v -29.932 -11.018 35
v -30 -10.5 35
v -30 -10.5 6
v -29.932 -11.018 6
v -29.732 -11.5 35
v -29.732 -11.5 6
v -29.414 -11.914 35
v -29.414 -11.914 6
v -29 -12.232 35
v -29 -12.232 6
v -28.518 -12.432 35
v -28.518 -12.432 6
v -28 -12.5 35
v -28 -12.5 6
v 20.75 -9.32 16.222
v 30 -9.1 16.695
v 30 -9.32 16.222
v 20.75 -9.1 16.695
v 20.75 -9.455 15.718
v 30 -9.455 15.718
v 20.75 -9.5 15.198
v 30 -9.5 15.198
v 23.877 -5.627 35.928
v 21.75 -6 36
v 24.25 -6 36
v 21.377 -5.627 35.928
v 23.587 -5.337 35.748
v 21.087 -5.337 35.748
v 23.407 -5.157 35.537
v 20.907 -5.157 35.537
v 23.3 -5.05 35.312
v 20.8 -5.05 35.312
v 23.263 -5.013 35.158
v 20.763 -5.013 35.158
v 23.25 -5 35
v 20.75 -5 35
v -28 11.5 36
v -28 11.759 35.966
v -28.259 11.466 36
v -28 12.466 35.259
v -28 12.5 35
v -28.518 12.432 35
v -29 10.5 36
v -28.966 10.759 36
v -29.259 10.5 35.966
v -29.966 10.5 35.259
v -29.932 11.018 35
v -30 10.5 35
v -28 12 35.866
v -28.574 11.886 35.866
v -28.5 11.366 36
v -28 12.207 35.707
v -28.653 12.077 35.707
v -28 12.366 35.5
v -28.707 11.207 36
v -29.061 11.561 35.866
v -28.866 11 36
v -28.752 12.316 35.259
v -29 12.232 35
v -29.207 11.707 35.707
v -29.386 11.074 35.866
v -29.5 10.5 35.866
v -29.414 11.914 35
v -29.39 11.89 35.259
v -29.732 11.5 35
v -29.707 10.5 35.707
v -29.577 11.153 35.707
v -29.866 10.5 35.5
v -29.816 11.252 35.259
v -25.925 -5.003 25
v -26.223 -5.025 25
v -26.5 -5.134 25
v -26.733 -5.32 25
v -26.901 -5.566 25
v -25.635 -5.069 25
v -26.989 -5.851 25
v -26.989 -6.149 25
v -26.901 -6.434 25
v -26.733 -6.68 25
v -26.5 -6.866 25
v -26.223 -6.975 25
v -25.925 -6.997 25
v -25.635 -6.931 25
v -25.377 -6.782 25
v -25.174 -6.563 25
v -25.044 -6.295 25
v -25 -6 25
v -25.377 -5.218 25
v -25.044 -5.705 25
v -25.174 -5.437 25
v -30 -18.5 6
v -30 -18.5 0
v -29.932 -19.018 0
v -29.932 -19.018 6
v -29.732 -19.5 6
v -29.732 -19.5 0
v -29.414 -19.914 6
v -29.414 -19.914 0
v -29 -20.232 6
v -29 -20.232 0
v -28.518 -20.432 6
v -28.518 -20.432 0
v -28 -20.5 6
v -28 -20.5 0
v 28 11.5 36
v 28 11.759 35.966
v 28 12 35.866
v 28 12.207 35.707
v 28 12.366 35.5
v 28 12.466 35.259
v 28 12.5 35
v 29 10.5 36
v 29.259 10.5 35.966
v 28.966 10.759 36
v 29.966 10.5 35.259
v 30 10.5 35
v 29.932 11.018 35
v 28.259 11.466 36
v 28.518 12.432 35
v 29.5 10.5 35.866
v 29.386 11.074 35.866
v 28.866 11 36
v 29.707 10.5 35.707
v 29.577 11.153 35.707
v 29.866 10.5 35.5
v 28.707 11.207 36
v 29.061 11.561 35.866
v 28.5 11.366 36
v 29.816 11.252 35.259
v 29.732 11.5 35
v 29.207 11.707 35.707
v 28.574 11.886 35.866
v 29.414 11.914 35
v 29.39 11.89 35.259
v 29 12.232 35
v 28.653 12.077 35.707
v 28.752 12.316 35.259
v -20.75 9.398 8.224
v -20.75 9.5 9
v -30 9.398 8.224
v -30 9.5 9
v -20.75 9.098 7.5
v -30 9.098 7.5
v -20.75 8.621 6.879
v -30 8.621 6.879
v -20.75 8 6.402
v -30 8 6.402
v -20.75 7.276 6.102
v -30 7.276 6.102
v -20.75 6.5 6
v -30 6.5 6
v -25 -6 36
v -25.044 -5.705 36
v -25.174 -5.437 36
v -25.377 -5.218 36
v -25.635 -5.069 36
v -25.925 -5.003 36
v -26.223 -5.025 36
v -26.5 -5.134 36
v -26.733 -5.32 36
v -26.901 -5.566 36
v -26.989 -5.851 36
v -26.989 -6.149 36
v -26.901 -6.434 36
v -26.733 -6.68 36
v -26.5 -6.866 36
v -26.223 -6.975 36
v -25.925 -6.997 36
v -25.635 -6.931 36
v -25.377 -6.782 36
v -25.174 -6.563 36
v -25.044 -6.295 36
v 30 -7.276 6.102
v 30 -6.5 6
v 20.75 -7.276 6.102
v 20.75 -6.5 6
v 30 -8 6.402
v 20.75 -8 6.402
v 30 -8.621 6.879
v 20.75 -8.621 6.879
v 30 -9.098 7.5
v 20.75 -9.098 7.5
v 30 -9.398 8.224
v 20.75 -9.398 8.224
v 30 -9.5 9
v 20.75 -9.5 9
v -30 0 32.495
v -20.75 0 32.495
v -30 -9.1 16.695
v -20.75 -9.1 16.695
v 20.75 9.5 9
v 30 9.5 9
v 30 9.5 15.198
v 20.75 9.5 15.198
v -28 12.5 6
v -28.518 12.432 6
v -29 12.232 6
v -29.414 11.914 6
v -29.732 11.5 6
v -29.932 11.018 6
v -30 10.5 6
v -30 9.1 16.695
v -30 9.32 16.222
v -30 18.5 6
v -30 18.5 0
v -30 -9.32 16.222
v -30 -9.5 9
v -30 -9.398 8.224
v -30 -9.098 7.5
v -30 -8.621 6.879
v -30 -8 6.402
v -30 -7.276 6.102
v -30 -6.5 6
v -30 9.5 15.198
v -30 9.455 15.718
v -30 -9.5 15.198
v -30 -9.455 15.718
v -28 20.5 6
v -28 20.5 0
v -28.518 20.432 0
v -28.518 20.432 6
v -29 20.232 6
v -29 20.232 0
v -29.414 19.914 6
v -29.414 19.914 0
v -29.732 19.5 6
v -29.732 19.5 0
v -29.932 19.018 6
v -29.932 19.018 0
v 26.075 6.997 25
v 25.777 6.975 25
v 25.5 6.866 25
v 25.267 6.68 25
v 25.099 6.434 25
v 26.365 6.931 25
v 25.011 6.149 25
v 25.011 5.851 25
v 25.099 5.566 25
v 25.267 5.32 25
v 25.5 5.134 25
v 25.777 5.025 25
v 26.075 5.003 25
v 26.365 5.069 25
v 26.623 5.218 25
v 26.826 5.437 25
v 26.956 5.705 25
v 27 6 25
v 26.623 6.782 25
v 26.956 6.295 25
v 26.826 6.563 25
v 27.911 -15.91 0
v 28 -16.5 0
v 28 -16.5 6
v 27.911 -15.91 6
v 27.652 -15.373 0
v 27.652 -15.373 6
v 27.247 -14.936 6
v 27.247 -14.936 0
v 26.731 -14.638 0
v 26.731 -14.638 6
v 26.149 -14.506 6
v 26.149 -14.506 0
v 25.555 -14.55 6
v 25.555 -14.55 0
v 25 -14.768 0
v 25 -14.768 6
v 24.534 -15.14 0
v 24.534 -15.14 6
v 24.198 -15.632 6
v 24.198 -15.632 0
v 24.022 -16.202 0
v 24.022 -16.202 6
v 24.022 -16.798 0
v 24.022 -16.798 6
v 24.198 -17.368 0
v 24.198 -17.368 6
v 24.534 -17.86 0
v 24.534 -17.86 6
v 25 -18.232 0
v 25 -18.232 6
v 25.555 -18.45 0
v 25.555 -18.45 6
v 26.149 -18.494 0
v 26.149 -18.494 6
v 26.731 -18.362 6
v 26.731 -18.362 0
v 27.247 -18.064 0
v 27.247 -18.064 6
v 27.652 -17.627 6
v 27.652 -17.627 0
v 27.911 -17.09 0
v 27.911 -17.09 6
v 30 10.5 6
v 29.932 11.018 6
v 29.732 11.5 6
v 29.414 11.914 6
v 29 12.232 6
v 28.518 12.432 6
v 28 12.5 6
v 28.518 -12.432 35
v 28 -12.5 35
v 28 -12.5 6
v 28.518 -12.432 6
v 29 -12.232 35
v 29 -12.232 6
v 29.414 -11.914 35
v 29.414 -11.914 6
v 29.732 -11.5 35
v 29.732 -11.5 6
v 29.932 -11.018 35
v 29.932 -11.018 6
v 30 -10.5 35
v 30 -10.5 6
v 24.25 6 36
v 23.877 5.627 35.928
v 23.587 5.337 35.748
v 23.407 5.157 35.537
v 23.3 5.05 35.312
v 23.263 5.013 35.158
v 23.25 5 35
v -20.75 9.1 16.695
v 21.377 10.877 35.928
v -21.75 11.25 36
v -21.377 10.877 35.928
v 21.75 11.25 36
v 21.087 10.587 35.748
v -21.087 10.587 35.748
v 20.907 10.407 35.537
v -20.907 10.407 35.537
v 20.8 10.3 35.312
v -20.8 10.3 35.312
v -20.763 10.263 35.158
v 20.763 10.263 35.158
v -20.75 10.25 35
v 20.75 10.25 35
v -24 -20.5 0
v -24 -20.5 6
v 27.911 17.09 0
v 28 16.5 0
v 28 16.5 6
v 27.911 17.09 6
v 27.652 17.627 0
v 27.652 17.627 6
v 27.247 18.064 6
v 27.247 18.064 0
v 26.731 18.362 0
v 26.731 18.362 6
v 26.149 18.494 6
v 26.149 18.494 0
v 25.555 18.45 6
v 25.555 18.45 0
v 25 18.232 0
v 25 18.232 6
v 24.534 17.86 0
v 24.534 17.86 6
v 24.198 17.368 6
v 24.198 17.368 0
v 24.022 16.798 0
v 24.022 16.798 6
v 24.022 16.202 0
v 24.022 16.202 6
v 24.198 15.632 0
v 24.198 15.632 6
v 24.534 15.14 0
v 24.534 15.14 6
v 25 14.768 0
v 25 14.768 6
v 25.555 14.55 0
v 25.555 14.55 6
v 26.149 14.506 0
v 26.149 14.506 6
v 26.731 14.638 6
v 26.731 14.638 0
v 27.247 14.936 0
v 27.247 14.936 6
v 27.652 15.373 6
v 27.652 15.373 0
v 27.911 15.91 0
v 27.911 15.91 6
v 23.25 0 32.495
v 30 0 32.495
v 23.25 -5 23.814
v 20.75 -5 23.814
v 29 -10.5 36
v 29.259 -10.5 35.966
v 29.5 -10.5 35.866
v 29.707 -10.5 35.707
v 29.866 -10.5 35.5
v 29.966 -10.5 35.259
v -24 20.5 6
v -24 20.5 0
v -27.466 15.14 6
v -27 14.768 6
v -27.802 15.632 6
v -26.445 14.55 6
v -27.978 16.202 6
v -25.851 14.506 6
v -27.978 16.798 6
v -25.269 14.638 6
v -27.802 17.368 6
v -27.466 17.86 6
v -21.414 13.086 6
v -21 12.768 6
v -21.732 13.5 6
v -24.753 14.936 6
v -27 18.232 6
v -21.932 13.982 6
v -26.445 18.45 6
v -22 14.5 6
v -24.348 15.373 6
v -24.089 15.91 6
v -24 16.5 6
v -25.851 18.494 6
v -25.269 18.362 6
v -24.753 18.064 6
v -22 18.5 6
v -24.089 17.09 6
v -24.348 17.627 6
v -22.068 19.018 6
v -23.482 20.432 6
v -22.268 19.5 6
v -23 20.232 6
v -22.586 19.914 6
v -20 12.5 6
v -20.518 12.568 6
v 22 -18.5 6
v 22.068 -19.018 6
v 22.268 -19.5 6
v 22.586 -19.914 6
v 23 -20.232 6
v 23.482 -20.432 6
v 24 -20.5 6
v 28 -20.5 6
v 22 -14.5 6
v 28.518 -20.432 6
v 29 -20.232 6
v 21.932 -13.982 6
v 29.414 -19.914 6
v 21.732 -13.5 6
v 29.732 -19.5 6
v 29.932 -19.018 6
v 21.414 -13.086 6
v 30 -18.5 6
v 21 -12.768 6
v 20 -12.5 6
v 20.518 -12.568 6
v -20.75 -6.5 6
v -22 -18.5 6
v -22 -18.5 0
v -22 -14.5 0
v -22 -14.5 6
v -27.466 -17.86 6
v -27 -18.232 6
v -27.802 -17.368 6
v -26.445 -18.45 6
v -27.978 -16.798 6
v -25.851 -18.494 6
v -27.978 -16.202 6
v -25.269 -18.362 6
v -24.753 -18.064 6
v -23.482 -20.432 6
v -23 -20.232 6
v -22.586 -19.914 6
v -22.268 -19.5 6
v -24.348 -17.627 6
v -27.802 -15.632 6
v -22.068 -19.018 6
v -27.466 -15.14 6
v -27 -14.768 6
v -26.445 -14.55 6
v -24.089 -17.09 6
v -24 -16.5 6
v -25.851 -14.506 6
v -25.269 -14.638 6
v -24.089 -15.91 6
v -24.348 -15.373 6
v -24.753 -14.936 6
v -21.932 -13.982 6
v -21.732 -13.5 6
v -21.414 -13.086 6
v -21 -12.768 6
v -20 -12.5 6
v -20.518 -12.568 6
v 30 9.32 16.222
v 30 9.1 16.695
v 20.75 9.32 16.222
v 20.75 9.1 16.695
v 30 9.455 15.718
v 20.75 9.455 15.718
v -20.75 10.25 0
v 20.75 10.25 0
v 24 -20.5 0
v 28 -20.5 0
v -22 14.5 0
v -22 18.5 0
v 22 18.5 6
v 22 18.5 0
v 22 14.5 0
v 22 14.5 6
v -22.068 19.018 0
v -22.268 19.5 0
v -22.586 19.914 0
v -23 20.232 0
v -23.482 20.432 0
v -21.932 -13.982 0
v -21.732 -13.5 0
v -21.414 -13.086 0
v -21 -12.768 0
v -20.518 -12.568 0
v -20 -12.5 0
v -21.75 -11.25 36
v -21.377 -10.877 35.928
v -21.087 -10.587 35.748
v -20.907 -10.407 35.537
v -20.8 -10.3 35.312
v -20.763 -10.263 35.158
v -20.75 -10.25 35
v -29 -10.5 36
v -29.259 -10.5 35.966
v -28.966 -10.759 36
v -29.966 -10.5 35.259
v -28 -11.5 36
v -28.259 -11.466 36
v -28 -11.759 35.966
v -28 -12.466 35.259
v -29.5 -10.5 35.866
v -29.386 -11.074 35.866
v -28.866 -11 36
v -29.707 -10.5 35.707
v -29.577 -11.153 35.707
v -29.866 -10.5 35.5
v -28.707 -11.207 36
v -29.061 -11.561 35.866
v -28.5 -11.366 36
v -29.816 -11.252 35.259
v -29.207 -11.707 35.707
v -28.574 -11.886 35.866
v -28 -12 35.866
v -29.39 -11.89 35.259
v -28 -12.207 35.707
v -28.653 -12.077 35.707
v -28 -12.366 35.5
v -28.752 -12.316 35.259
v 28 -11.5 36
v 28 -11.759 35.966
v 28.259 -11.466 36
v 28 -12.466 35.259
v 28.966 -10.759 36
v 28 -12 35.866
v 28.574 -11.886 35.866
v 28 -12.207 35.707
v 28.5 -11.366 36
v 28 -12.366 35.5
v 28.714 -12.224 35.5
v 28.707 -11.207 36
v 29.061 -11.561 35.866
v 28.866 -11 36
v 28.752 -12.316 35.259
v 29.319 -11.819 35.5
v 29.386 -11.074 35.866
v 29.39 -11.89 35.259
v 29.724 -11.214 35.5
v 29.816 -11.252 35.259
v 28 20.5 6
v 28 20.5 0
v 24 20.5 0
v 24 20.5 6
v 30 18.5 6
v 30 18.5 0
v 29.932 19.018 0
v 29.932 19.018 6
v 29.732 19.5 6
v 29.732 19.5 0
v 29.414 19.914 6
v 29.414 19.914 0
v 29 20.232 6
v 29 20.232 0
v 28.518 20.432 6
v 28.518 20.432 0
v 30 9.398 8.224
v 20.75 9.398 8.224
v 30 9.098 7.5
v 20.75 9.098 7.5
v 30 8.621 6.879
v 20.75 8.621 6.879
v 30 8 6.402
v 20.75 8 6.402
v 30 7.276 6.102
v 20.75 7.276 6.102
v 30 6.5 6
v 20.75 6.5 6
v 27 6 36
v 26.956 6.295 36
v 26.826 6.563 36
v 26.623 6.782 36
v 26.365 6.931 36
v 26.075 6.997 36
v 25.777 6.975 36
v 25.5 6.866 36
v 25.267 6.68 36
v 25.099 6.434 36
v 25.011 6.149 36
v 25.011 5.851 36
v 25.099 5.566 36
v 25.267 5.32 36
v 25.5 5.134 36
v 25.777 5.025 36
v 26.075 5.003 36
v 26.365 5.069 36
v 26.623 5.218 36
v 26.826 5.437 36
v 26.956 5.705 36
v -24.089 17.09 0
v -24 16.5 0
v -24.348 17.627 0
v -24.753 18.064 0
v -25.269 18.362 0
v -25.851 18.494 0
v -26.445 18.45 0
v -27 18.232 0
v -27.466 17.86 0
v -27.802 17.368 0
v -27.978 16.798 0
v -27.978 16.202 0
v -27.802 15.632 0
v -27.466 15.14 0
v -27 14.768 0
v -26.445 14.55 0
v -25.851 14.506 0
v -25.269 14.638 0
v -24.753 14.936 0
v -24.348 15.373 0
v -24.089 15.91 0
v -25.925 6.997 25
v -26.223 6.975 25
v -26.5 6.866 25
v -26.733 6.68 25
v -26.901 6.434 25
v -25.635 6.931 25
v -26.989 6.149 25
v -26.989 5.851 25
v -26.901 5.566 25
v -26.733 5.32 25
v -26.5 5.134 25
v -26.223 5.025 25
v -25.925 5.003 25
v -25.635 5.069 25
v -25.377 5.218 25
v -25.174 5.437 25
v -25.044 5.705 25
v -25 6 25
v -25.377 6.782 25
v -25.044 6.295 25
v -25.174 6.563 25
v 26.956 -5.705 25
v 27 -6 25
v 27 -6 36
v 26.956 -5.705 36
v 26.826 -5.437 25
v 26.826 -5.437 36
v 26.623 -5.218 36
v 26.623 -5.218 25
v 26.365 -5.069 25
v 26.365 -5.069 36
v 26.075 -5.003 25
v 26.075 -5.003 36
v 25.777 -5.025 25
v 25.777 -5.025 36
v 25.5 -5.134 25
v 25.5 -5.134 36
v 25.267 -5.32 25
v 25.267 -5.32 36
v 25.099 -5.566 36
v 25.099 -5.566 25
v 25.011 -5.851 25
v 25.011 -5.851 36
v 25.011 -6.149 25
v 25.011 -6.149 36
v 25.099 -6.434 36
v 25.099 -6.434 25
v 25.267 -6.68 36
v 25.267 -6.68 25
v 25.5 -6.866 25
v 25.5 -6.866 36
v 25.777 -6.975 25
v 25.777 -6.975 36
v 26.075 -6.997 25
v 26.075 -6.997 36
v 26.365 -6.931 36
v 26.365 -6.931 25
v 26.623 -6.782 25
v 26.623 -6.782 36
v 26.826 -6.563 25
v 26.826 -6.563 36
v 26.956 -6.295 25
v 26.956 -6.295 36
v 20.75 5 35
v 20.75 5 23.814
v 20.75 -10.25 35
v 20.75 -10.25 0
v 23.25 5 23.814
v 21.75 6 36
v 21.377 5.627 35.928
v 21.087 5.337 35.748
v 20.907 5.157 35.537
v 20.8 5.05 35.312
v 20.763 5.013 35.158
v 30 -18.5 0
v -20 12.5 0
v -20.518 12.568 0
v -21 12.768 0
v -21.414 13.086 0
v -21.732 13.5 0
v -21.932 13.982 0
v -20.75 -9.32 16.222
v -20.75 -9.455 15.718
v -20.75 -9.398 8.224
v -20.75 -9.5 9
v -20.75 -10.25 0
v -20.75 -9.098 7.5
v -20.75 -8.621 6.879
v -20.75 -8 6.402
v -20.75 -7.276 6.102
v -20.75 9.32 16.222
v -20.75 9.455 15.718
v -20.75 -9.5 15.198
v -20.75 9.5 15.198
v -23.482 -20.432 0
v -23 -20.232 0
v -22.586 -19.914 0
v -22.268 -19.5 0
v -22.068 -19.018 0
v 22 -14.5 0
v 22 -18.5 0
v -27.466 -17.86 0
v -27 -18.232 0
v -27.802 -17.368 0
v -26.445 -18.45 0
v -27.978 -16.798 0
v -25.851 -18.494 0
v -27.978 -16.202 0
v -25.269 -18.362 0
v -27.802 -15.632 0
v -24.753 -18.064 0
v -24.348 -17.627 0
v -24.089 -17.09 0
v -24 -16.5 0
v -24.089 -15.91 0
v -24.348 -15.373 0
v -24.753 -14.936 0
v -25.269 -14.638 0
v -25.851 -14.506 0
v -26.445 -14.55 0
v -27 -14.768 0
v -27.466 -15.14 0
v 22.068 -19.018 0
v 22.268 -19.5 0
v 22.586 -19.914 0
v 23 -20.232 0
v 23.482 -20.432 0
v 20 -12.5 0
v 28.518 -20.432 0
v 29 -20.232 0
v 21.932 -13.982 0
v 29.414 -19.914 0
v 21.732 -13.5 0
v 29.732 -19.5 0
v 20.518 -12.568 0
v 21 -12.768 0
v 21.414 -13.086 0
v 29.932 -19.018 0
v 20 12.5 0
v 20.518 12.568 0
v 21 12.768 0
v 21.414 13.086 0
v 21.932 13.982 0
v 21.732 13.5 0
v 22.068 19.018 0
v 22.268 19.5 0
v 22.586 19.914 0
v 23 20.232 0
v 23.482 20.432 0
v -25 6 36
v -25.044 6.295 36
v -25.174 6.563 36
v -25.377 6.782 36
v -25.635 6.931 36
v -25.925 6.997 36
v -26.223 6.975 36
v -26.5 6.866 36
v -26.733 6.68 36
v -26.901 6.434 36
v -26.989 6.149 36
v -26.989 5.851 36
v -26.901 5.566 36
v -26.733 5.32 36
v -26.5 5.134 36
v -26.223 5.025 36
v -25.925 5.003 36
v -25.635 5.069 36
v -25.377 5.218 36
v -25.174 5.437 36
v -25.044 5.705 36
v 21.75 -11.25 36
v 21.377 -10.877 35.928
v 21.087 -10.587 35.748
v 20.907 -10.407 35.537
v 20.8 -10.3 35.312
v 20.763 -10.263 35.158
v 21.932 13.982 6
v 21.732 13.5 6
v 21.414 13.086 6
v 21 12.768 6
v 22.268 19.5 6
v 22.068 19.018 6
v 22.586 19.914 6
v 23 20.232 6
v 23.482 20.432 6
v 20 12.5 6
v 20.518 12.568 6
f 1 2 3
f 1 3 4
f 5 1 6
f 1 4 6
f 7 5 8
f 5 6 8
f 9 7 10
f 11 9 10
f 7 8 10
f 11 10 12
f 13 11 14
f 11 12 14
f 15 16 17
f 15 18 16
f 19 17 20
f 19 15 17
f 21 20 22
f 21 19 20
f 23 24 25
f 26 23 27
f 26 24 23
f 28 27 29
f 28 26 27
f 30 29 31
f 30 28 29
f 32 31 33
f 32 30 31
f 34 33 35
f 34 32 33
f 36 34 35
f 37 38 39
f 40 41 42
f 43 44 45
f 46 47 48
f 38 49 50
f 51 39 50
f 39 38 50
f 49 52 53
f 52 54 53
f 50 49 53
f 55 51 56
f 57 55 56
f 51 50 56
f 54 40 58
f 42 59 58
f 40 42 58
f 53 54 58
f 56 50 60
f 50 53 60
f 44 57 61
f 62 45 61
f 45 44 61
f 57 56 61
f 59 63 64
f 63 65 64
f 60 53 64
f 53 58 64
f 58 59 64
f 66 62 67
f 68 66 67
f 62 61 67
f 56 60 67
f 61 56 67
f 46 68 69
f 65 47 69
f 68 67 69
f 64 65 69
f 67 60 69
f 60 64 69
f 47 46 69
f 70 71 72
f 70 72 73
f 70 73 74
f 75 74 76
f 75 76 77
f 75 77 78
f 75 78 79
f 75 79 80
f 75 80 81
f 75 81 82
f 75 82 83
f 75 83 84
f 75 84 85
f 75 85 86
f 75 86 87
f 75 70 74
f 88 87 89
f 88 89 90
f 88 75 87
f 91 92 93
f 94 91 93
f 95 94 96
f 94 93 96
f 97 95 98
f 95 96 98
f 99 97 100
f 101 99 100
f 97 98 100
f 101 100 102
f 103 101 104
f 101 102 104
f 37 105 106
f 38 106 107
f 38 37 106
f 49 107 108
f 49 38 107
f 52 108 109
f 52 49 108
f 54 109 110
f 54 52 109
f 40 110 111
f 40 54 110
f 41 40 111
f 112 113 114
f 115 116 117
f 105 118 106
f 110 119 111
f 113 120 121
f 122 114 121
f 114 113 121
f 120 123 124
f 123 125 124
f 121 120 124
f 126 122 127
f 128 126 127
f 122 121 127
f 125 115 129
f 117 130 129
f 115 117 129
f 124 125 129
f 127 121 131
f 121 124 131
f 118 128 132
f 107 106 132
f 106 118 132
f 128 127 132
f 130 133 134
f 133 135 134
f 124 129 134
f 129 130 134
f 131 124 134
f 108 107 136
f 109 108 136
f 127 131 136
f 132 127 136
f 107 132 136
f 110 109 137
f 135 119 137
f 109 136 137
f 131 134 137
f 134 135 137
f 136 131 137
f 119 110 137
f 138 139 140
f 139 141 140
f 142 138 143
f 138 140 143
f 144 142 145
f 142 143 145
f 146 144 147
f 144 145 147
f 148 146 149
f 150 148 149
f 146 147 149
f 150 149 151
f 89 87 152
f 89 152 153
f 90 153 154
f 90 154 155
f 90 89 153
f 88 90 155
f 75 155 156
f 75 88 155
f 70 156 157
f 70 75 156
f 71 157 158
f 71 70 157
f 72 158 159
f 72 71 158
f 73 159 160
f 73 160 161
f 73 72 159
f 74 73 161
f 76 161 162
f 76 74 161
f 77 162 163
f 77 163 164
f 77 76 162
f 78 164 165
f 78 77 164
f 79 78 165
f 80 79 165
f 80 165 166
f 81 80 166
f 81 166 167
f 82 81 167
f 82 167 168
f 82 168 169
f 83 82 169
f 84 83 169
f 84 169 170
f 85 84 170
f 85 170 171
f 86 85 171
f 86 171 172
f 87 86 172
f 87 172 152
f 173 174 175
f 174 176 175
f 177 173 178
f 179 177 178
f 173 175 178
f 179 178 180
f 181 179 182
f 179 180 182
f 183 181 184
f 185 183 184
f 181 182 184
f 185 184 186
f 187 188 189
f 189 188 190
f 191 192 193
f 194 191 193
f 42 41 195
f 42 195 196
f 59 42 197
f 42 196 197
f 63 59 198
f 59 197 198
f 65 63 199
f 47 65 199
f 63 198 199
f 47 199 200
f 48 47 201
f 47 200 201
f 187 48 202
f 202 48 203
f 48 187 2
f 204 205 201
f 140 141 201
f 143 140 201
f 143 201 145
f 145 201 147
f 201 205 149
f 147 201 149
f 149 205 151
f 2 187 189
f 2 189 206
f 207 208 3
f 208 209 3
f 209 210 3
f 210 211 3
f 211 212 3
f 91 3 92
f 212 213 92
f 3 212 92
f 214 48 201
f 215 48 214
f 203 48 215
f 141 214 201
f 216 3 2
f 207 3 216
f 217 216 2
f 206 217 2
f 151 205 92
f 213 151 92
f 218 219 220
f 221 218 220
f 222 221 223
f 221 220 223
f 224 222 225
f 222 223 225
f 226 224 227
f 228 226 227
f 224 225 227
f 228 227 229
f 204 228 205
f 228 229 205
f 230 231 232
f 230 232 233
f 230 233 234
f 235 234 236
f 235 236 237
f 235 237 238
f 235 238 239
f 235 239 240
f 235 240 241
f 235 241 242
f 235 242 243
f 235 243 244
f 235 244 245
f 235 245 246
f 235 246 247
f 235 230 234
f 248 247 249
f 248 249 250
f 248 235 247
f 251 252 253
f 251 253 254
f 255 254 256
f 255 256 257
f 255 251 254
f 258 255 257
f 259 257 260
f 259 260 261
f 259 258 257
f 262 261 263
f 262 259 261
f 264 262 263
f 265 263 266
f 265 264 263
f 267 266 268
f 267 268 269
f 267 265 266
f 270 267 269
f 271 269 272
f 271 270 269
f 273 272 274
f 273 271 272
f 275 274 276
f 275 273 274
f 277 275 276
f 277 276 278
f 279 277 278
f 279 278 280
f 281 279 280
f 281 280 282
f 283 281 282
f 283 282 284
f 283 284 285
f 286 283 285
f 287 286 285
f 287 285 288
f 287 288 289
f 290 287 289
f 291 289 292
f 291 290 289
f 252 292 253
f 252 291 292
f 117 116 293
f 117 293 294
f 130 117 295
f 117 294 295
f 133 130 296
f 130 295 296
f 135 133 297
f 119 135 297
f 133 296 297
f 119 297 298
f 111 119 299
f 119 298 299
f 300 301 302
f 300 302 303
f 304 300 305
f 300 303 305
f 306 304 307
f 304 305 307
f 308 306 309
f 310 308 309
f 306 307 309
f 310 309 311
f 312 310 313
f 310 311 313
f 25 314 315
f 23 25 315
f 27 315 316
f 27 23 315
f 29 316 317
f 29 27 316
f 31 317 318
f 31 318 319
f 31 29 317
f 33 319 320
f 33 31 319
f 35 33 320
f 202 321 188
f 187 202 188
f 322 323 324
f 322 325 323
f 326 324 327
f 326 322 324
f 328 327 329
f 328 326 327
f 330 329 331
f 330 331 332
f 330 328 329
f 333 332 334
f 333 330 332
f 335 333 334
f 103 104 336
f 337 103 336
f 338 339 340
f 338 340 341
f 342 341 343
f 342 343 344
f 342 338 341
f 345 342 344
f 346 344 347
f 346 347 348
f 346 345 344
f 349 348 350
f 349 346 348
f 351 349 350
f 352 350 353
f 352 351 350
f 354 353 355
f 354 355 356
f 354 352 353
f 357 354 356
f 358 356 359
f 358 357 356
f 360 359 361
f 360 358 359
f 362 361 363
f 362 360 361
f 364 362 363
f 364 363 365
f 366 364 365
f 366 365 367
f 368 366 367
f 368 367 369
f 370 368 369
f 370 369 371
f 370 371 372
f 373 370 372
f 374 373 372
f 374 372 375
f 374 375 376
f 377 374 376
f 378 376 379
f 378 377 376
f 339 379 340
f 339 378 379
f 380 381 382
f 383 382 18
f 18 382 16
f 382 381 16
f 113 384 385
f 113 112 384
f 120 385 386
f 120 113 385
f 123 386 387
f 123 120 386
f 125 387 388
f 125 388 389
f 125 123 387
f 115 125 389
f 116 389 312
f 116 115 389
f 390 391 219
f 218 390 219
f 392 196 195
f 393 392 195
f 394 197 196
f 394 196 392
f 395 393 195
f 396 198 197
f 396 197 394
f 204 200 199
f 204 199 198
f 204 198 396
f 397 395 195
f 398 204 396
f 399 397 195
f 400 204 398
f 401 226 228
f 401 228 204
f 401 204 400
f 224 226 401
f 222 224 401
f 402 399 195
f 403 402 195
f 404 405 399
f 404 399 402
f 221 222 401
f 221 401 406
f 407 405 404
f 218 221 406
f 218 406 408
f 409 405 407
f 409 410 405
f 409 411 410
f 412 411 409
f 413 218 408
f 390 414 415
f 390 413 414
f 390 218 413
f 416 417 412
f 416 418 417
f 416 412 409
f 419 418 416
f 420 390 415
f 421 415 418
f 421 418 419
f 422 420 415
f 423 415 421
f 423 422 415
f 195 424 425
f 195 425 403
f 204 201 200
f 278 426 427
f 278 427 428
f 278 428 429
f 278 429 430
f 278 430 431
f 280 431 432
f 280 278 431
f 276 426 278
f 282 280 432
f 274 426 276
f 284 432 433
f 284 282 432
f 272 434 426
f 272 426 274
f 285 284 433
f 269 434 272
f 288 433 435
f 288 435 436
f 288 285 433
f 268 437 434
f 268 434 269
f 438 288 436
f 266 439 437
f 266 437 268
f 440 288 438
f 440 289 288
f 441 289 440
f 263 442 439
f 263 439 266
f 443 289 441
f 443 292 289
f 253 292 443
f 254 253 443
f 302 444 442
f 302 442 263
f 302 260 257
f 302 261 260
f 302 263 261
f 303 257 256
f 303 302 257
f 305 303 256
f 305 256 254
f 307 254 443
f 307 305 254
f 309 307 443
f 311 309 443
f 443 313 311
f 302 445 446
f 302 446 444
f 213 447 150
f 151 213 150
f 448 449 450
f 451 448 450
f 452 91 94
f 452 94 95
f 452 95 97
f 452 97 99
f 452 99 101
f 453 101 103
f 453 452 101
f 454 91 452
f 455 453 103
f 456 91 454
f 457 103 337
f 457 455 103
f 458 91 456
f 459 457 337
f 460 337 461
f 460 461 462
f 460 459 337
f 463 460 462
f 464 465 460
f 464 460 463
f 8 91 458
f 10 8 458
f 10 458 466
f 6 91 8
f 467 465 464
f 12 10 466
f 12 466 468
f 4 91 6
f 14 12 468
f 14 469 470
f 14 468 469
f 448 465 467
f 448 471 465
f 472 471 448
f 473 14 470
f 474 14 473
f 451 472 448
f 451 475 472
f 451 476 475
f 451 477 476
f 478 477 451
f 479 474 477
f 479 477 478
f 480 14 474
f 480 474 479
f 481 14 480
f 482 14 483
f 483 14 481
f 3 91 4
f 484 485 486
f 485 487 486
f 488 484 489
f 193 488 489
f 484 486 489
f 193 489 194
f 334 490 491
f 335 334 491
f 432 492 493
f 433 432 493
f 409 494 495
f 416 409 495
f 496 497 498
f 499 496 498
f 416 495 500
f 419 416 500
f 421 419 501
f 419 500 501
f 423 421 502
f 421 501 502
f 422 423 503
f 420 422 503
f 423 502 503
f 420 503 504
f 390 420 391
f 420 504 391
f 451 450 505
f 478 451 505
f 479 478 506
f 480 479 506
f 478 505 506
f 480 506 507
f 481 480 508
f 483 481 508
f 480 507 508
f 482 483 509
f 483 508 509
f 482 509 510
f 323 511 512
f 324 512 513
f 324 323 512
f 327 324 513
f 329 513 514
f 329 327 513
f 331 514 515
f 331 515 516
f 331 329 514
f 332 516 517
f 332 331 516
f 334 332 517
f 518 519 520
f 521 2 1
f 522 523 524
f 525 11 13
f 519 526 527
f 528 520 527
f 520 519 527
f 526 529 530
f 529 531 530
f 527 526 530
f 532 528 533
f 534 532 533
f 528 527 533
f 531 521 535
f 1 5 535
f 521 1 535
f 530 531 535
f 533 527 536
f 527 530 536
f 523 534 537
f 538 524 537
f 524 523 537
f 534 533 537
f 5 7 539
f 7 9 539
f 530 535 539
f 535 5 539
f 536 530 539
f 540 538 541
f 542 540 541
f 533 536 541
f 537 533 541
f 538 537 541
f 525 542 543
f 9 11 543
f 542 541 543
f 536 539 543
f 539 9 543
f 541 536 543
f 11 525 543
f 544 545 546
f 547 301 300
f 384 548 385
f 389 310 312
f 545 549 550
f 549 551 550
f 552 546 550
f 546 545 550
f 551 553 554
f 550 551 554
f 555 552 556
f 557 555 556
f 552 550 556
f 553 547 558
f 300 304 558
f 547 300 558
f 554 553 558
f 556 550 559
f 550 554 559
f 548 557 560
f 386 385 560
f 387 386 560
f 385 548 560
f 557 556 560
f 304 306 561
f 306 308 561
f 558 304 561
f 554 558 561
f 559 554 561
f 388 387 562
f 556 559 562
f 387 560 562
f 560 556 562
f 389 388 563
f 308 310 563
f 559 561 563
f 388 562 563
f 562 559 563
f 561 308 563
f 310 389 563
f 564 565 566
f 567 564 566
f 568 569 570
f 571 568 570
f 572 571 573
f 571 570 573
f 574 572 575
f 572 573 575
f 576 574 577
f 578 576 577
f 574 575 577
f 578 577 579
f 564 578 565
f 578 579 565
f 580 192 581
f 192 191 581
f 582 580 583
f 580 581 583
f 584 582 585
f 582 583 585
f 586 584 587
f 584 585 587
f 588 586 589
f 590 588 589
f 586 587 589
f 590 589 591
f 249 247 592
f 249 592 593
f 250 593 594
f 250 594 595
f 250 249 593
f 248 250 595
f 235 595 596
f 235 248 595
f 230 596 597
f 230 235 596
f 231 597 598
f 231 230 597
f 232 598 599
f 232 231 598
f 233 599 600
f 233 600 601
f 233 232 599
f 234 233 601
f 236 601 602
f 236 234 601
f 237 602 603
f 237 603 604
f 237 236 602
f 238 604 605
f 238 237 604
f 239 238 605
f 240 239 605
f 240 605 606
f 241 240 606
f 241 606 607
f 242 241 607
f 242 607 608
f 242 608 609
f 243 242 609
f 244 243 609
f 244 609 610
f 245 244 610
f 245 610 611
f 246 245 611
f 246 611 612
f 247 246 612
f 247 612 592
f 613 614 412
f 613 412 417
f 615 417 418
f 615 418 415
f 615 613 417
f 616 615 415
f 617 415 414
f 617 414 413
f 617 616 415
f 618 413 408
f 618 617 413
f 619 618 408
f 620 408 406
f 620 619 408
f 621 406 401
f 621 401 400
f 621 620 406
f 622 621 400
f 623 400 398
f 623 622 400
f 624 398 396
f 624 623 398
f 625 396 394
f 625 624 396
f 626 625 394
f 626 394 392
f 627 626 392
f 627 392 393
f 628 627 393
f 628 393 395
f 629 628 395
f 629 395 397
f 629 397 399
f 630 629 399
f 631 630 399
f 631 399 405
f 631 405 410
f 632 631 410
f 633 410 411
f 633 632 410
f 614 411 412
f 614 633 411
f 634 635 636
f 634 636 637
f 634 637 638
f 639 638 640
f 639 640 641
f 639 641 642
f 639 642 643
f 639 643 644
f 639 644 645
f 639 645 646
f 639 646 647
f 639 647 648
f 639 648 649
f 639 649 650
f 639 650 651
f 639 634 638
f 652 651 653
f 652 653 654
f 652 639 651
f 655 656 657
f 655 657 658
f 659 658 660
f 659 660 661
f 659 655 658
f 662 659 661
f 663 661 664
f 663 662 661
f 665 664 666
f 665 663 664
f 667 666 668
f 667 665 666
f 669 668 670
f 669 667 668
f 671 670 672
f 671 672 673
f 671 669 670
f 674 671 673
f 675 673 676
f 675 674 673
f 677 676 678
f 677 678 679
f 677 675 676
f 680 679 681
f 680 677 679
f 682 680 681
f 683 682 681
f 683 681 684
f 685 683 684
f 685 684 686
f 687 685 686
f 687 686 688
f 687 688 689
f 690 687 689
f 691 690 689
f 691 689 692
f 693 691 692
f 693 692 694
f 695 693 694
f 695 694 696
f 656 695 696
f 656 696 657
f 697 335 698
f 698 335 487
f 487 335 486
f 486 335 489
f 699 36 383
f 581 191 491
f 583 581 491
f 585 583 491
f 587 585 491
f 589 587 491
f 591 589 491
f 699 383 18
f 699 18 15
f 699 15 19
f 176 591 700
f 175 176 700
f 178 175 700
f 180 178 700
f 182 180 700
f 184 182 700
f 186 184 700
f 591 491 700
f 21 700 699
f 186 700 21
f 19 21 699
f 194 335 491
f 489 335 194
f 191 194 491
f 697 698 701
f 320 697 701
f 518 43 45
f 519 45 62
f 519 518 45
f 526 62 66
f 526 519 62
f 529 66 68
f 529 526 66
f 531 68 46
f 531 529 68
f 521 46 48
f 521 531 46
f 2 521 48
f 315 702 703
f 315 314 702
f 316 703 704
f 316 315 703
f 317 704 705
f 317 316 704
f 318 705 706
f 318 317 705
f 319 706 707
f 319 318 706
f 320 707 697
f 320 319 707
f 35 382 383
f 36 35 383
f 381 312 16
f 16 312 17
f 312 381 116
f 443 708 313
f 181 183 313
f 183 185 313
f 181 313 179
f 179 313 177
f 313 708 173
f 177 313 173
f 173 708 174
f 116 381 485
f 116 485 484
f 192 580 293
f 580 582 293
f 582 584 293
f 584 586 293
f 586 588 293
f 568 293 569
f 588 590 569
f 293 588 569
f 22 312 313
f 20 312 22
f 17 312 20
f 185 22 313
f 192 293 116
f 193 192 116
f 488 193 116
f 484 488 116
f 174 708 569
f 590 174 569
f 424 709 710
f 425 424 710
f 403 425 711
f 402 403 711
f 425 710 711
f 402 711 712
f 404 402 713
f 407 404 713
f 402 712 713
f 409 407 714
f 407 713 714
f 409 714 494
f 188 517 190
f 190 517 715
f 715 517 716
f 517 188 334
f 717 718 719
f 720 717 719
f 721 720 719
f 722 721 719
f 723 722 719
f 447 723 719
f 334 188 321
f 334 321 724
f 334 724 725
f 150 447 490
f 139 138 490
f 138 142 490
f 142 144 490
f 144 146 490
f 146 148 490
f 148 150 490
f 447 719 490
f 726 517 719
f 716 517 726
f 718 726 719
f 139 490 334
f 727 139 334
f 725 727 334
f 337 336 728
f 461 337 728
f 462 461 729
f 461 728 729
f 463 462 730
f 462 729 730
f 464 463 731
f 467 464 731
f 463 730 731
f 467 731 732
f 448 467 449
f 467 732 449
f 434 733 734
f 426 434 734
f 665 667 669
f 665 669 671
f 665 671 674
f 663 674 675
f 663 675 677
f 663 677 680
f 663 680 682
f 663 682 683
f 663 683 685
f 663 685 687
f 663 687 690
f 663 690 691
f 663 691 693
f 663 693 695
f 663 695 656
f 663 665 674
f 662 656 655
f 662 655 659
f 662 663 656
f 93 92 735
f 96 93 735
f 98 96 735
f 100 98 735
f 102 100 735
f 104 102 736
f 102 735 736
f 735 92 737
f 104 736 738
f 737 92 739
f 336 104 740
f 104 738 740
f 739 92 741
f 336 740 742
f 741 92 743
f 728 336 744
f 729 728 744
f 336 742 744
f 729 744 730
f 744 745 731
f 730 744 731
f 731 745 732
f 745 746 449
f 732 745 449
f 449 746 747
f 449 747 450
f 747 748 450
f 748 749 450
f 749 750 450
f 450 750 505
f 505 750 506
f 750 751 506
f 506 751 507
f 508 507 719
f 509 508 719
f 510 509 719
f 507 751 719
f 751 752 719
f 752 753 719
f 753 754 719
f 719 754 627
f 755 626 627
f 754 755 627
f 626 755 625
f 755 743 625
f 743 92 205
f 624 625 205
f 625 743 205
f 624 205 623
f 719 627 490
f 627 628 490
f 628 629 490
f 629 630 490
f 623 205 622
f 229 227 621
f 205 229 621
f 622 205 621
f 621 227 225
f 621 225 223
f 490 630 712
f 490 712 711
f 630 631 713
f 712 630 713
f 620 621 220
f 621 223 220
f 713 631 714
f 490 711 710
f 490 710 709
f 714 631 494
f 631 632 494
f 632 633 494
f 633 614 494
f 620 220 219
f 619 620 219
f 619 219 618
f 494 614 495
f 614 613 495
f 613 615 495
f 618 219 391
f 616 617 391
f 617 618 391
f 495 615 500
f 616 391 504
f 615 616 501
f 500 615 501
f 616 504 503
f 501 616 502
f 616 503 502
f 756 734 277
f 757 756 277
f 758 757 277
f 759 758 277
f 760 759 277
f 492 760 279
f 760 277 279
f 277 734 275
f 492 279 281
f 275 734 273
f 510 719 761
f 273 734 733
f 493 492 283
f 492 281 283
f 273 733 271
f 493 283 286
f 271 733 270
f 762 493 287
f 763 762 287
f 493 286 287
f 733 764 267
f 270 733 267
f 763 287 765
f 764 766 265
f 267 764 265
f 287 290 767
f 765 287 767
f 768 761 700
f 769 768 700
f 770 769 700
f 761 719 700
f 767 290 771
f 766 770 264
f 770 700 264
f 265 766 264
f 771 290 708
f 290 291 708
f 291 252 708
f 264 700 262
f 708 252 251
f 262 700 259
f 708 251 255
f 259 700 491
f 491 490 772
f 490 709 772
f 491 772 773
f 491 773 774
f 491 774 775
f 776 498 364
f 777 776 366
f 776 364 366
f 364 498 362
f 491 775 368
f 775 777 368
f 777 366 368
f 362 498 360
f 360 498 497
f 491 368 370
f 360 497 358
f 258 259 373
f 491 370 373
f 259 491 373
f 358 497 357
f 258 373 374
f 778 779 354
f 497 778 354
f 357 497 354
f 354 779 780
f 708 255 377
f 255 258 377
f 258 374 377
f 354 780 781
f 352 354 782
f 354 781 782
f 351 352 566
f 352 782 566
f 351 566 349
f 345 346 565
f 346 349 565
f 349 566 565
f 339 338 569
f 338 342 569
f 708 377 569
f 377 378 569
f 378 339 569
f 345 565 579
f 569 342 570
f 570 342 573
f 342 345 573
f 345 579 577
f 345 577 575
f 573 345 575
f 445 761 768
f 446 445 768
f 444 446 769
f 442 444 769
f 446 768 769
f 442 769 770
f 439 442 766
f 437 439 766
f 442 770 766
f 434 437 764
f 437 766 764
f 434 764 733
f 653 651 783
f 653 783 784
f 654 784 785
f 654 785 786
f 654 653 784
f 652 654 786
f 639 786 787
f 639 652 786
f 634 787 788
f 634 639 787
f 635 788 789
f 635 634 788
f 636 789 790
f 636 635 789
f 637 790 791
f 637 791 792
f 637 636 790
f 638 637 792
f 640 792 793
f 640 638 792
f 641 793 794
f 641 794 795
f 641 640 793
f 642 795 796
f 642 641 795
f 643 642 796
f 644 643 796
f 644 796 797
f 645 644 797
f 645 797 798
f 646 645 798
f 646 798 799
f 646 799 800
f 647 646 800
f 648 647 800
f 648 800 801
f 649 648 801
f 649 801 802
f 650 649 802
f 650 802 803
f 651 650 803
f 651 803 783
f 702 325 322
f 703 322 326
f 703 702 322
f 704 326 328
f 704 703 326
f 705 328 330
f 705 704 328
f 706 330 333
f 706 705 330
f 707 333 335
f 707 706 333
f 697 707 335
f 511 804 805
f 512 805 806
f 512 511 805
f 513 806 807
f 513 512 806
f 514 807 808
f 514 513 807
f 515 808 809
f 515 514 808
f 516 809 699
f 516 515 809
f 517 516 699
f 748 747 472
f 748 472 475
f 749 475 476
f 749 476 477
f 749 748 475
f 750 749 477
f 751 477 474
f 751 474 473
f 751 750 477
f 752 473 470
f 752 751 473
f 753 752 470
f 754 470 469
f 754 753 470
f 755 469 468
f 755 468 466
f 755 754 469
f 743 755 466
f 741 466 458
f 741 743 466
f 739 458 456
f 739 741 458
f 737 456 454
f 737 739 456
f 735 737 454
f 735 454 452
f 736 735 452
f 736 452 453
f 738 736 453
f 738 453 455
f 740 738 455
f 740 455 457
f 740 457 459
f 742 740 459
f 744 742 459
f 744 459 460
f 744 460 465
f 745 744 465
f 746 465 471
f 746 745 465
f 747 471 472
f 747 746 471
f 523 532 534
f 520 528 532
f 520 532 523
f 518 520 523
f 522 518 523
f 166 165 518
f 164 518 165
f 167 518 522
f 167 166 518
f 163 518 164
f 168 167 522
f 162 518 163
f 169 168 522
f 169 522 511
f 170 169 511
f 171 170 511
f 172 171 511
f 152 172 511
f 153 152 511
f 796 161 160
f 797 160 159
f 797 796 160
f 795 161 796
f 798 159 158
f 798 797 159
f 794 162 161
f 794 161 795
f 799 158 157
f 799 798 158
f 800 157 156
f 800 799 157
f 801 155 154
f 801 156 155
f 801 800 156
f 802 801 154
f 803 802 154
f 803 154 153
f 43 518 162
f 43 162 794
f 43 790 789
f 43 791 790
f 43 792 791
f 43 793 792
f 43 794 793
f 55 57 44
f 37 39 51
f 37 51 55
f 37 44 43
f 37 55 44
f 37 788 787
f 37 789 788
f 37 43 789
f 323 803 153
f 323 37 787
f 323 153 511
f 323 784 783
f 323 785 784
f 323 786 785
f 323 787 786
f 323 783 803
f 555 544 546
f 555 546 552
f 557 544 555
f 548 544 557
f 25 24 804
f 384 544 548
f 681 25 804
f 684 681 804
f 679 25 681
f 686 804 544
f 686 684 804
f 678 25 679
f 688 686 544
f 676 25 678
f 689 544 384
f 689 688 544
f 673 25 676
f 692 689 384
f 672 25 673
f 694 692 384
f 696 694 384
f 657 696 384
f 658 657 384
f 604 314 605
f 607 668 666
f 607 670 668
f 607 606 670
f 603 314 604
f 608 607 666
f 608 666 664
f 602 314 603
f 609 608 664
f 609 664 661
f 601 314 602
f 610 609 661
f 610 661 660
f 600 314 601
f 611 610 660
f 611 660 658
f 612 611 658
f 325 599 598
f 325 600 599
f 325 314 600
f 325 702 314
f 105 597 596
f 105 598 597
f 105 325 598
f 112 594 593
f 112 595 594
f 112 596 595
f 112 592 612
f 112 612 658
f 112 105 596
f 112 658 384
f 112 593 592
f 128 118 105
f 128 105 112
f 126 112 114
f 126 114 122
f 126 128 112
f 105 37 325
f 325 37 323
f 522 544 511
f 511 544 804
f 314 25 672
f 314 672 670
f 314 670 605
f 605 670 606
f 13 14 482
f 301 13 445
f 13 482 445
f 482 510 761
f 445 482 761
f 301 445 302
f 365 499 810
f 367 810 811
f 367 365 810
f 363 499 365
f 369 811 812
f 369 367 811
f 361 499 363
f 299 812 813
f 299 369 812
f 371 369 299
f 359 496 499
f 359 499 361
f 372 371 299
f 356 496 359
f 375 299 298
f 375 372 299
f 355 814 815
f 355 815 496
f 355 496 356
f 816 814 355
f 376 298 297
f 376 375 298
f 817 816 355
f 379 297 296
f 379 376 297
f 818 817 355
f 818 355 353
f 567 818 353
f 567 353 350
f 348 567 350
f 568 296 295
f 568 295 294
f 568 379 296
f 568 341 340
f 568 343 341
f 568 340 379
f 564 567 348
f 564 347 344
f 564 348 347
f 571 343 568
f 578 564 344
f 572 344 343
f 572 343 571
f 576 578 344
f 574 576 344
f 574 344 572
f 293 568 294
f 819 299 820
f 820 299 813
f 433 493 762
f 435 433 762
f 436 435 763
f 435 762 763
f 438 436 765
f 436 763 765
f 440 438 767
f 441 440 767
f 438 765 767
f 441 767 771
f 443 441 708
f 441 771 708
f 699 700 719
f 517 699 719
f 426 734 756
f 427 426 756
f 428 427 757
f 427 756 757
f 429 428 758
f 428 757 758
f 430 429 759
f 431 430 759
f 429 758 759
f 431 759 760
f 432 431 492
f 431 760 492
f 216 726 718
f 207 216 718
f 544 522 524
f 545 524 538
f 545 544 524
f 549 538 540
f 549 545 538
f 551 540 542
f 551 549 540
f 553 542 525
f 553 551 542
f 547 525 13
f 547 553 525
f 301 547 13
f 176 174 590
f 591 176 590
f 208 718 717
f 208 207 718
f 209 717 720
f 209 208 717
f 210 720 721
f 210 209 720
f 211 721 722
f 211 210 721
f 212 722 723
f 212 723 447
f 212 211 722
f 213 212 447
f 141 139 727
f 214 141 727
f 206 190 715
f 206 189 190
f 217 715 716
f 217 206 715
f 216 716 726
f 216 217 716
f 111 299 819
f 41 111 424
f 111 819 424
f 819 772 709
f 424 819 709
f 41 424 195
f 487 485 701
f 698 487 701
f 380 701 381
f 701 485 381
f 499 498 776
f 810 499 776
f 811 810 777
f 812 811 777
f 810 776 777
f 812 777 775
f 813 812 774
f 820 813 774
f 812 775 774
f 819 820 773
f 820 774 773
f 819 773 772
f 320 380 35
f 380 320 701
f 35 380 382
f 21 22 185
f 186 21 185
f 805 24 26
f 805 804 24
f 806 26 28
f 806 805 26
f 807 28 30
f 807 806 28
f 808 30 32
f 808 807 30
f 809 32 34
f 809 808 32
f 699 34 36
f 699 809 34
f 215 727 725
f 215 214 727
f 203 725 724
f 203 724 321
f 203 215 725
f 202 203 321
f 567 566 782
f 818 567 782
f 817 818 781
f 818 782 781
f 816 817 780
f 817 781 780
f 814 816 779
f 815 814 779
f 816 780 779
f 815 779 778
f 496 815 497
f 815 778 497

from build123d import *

# Parameters (mm, degrees)
F0_R     = 1
F1_DEPTH = 36
F0_R_2   = 2
F2_DEPTH = 6
F3_R     = 1
F4_R     = 1
F5_DEPTH = 25
F7_DEPTH = 100
F8_R     = 3


with BuildPart() as f1:
    # F0 (on Top) → F1 (new body)
    with BuildSketch(Plane.XY):
        with BuildLine():
            Line((-20, -12.5), (20, -12.5))
            Line((20, -12.5), (22, -12.5))
            Line((22, -12.5), (28, -12.5))
            ThreePointArc((28, -12.5), (29.414214, -11.914214), (30, -10.5))
            Line((30, -10.5), (30, 10.5))
            ThreePointArc((30, 10.5), (29.414214, 11.914214), (28, 12.5))
            Line((28, 12.5), (22, 12.5))
            Line((22, 12.5), (20, 12.5))
            Line((20, 12.5), (-20, 12.5))
            Line((-20, 12.5), (-28, 12.5))
            ThreePointArc((-28, 12.5), (-29.414214, 11.914214), (-30, 10.5))
            Line((-30, 10.5), (-30, -10.5))
            ThreePointArc((-30, -10.5), (-29.414214, -11.914214), (-28, -12.5))
            Line((-28, -12.5), (-22, -12.5))
            Line((-22, -12.5), (-20, -12.5))
        make_face()
        with Locations((-26, -6)):
            Circle(F0_R, mode=Mode.SUBTRACT)
        with Locations((26, -6)):
            Circle(F0_R, mode=Mode.SUBTRACT)
        with Locations((-26, 6)):
            Circle(F0_R, mode=Mode.SUBTRACT)
        Polygon((20.75, -10.25), (-20.75, -10.25), (-20.75, 10.25), (20.75, 10.25), (20.75, 5), (23.25, 5), (23.25, -5), (20.75, -5), align=None, mode=Mode.SUBTRACT)
        with Locations((26, 6)):
            Circle(F0_R, mode=Mode.SUBTRACT)
    extrude(amount=F1_DEPTH)

    # F0 (on Top) → F2 (join)
    with BuildSketch(Plane.XY):
        with BuildLine():
            ThreePointArc((-22, -14.5), (-21.414214, -13.085786), (-20, -12.5))
            Line((-20, -12.5), (-22, -12.5))
            Line((-22, -12.5), (-28, -12.5))
            ThreePointArc((-28, -12.5), (-29.414214, -11.914214), (-30, -10.5))
            Line((-30, -10.5), (-30, -12.5))
            Line((-30, -12.5), (-30, -18.5))
            ThreePointArc((-30, -18.5), (-29.414214, -19.914214), (-28, -20.5))
            Line((-28, -20.5), (-24, -20.5))
            ThreePointArc((-24, -20.5), (-22.585786, -19.914214), (-22, -18.5))
            Line((-22, -18.5), (-22, -14.5))
        make_face()
        with Locations((-26, -16.5)):
            Circle(F0_R_2, mode=Mode.SUBTRACT)
        with BuildLine():
            Line((22, -12.5), (20, -12.5))
            ThreePointArc((20, -12.5), (21.414214, -13.085786), (22, -14.5))
            Line((22, -14.5), (22, -18.5))
            ThreePointArc((22, -18.5), (22.585786, -19.914214), (24, -20.5))
            Line((24, -20.5), (28, -20.5))
            ThreePointArc((28, -20.5), (29.414214, -19.914214), (30, -18.5))
            Line((30, -18.5), (30, -12.5))
            Line((30, -12.5), (30, -10.5))
            ThreePointArc((30, -10.5), (29.414214, -11.914214), (28, -12.5))
            Line((28, -12.5), (22, -12.5))
        make_face()
        with Locations((26, -16.5)):
            Circle(F0_R_2, mode=Mode.SUBTRACT)
        with BuildLine():
            ThreePointArc((28, 12.5), (29.414214, 11.914214), (30, 10.5))
            Line((30, 10.5), (30, 12.5))
            Line((30, 12.5), (30, 18.5))
            ThreePointArc((30, 18.5), (29.414214, 19.914214), (28, 20.5))
            Line((28, 20.5), (24, 20.5))
            ThreePointArc((24, 20.5), (22.585786, 19.914214), (22, 18.5))
            Line((22, 18.5), (22, 14.5))
            ThreePointArc((22, 14.5), (21.414214, 13.085786), (20, 12.5))
            Line((20, 12.5), (22, 12.5))
            Line((22, 12.5), (28, 12.5))
        make_face()
        with Locations((26, 16.5)):
            Circle(F0_R_2, mode=Mode.SUBTRACT)
        with BuildLine():
            Line((-30, 12.5), (-30, 10.5))
            ThreePointArc((-30, 10.5), (-29.414214, 11.914214), (-28, 12.5))
            Line((-28, 12.5), (-20, 12.5))
            ThreePointArc((-20, 12.5), (-21.414214, 13.085786), (-22, 14.5))
            Line((-22, 14.5), (-22, 18.5))
            ThreePointArc((-22, 18.5), (-22.585786, 19.914214), (-24, 20.5))
            Line((-24, 20.5), (-28, 20.5))
            ThreePointArc((-28, 20.5), (-29.414214, 19.914214), (-30, 18.5))
            Line((-30, 18.5), (-30, 12.5))
        make_face()
        with Locations((-26, 16.5)):
            Circle(F0_R_2, mode=Mode.SUBTRACT)
        Polygon((20.75, 0), (20.75, -5), (23.25, -5), (23.25, 5), (20.75, 5), align=None)
    extrude(amount=F2_DEPTH)

    # F3
    f3_edges = [f1.edges().sort_by_distance(p)[0] for p in [
        (0, 10.25, 36),
        (-20.75, 0, 36),
        (20.75, 7.625, 36),
        (20.75, -7.625, 36),
        (0, -10.25, 36),
        (22, -5, 36),
        (23.25, 0, 36),
        (22, 5, 36),
    ]]
    fillet(f3_edges, radius=F3_R)

    # F4
    f4_edges = [f1.edges().sort_by_distance(p)[0] for p in [
        (30, 0, 36),
        (0, 12.5, 36),
        (0, -12.5, 36),
        (29.414214, -11.914214, 36),
        (29.414214, 11.914214, 36),
        (-30, 0, 36),
        (-29.414214, 11.914214, 36),
        (-29.414214, -11.914214, 36),
    ]]
    fillet(f4_edges, radius=F4_R)

    # F0 (on Top) → F5 (join)
    with BuildSketch(Plane.XY):
        with Locations((-26, 6)):
            Circle(F0_R)
        with Locations((-26, -6)):
            Circle(F0_R)
        with Locations((26, -6)):
            Circle(F0_R)
        with Locations((26, 6)):
            Circle(F0_R)
    extrude(amount=F5_DEPTH)

    # F6 (on face) → F7 (cut)
    with BuildSketch(Plane.YZ.offset(30)):
        Polygon((-9.5, 6), (9.5, 6), (9.5, 16), (0, 32.49523), (-9.5, 16), align=None)
    extrude(amount=-F7_DEPTH, mode=Mode.SUBTRACT)

    # F8
    f8_edges = [f1.edges().sort_by_distance(p)[0] for p in [
        (25.375, -9.5, 6),
        (-25.375, -9.5, 6),
        (25.375, 9.5, 6),
        (-25.375, 9.5, 6),
        (25.375, 9.5, 16),
        (-25.375, 9.5, 16),
        (25.375, -9.5, 16),
        (-25.375, -9.5, 16),
    ]]
    fillet(f8_edges, radius=F8_R)


solid = f1.part
